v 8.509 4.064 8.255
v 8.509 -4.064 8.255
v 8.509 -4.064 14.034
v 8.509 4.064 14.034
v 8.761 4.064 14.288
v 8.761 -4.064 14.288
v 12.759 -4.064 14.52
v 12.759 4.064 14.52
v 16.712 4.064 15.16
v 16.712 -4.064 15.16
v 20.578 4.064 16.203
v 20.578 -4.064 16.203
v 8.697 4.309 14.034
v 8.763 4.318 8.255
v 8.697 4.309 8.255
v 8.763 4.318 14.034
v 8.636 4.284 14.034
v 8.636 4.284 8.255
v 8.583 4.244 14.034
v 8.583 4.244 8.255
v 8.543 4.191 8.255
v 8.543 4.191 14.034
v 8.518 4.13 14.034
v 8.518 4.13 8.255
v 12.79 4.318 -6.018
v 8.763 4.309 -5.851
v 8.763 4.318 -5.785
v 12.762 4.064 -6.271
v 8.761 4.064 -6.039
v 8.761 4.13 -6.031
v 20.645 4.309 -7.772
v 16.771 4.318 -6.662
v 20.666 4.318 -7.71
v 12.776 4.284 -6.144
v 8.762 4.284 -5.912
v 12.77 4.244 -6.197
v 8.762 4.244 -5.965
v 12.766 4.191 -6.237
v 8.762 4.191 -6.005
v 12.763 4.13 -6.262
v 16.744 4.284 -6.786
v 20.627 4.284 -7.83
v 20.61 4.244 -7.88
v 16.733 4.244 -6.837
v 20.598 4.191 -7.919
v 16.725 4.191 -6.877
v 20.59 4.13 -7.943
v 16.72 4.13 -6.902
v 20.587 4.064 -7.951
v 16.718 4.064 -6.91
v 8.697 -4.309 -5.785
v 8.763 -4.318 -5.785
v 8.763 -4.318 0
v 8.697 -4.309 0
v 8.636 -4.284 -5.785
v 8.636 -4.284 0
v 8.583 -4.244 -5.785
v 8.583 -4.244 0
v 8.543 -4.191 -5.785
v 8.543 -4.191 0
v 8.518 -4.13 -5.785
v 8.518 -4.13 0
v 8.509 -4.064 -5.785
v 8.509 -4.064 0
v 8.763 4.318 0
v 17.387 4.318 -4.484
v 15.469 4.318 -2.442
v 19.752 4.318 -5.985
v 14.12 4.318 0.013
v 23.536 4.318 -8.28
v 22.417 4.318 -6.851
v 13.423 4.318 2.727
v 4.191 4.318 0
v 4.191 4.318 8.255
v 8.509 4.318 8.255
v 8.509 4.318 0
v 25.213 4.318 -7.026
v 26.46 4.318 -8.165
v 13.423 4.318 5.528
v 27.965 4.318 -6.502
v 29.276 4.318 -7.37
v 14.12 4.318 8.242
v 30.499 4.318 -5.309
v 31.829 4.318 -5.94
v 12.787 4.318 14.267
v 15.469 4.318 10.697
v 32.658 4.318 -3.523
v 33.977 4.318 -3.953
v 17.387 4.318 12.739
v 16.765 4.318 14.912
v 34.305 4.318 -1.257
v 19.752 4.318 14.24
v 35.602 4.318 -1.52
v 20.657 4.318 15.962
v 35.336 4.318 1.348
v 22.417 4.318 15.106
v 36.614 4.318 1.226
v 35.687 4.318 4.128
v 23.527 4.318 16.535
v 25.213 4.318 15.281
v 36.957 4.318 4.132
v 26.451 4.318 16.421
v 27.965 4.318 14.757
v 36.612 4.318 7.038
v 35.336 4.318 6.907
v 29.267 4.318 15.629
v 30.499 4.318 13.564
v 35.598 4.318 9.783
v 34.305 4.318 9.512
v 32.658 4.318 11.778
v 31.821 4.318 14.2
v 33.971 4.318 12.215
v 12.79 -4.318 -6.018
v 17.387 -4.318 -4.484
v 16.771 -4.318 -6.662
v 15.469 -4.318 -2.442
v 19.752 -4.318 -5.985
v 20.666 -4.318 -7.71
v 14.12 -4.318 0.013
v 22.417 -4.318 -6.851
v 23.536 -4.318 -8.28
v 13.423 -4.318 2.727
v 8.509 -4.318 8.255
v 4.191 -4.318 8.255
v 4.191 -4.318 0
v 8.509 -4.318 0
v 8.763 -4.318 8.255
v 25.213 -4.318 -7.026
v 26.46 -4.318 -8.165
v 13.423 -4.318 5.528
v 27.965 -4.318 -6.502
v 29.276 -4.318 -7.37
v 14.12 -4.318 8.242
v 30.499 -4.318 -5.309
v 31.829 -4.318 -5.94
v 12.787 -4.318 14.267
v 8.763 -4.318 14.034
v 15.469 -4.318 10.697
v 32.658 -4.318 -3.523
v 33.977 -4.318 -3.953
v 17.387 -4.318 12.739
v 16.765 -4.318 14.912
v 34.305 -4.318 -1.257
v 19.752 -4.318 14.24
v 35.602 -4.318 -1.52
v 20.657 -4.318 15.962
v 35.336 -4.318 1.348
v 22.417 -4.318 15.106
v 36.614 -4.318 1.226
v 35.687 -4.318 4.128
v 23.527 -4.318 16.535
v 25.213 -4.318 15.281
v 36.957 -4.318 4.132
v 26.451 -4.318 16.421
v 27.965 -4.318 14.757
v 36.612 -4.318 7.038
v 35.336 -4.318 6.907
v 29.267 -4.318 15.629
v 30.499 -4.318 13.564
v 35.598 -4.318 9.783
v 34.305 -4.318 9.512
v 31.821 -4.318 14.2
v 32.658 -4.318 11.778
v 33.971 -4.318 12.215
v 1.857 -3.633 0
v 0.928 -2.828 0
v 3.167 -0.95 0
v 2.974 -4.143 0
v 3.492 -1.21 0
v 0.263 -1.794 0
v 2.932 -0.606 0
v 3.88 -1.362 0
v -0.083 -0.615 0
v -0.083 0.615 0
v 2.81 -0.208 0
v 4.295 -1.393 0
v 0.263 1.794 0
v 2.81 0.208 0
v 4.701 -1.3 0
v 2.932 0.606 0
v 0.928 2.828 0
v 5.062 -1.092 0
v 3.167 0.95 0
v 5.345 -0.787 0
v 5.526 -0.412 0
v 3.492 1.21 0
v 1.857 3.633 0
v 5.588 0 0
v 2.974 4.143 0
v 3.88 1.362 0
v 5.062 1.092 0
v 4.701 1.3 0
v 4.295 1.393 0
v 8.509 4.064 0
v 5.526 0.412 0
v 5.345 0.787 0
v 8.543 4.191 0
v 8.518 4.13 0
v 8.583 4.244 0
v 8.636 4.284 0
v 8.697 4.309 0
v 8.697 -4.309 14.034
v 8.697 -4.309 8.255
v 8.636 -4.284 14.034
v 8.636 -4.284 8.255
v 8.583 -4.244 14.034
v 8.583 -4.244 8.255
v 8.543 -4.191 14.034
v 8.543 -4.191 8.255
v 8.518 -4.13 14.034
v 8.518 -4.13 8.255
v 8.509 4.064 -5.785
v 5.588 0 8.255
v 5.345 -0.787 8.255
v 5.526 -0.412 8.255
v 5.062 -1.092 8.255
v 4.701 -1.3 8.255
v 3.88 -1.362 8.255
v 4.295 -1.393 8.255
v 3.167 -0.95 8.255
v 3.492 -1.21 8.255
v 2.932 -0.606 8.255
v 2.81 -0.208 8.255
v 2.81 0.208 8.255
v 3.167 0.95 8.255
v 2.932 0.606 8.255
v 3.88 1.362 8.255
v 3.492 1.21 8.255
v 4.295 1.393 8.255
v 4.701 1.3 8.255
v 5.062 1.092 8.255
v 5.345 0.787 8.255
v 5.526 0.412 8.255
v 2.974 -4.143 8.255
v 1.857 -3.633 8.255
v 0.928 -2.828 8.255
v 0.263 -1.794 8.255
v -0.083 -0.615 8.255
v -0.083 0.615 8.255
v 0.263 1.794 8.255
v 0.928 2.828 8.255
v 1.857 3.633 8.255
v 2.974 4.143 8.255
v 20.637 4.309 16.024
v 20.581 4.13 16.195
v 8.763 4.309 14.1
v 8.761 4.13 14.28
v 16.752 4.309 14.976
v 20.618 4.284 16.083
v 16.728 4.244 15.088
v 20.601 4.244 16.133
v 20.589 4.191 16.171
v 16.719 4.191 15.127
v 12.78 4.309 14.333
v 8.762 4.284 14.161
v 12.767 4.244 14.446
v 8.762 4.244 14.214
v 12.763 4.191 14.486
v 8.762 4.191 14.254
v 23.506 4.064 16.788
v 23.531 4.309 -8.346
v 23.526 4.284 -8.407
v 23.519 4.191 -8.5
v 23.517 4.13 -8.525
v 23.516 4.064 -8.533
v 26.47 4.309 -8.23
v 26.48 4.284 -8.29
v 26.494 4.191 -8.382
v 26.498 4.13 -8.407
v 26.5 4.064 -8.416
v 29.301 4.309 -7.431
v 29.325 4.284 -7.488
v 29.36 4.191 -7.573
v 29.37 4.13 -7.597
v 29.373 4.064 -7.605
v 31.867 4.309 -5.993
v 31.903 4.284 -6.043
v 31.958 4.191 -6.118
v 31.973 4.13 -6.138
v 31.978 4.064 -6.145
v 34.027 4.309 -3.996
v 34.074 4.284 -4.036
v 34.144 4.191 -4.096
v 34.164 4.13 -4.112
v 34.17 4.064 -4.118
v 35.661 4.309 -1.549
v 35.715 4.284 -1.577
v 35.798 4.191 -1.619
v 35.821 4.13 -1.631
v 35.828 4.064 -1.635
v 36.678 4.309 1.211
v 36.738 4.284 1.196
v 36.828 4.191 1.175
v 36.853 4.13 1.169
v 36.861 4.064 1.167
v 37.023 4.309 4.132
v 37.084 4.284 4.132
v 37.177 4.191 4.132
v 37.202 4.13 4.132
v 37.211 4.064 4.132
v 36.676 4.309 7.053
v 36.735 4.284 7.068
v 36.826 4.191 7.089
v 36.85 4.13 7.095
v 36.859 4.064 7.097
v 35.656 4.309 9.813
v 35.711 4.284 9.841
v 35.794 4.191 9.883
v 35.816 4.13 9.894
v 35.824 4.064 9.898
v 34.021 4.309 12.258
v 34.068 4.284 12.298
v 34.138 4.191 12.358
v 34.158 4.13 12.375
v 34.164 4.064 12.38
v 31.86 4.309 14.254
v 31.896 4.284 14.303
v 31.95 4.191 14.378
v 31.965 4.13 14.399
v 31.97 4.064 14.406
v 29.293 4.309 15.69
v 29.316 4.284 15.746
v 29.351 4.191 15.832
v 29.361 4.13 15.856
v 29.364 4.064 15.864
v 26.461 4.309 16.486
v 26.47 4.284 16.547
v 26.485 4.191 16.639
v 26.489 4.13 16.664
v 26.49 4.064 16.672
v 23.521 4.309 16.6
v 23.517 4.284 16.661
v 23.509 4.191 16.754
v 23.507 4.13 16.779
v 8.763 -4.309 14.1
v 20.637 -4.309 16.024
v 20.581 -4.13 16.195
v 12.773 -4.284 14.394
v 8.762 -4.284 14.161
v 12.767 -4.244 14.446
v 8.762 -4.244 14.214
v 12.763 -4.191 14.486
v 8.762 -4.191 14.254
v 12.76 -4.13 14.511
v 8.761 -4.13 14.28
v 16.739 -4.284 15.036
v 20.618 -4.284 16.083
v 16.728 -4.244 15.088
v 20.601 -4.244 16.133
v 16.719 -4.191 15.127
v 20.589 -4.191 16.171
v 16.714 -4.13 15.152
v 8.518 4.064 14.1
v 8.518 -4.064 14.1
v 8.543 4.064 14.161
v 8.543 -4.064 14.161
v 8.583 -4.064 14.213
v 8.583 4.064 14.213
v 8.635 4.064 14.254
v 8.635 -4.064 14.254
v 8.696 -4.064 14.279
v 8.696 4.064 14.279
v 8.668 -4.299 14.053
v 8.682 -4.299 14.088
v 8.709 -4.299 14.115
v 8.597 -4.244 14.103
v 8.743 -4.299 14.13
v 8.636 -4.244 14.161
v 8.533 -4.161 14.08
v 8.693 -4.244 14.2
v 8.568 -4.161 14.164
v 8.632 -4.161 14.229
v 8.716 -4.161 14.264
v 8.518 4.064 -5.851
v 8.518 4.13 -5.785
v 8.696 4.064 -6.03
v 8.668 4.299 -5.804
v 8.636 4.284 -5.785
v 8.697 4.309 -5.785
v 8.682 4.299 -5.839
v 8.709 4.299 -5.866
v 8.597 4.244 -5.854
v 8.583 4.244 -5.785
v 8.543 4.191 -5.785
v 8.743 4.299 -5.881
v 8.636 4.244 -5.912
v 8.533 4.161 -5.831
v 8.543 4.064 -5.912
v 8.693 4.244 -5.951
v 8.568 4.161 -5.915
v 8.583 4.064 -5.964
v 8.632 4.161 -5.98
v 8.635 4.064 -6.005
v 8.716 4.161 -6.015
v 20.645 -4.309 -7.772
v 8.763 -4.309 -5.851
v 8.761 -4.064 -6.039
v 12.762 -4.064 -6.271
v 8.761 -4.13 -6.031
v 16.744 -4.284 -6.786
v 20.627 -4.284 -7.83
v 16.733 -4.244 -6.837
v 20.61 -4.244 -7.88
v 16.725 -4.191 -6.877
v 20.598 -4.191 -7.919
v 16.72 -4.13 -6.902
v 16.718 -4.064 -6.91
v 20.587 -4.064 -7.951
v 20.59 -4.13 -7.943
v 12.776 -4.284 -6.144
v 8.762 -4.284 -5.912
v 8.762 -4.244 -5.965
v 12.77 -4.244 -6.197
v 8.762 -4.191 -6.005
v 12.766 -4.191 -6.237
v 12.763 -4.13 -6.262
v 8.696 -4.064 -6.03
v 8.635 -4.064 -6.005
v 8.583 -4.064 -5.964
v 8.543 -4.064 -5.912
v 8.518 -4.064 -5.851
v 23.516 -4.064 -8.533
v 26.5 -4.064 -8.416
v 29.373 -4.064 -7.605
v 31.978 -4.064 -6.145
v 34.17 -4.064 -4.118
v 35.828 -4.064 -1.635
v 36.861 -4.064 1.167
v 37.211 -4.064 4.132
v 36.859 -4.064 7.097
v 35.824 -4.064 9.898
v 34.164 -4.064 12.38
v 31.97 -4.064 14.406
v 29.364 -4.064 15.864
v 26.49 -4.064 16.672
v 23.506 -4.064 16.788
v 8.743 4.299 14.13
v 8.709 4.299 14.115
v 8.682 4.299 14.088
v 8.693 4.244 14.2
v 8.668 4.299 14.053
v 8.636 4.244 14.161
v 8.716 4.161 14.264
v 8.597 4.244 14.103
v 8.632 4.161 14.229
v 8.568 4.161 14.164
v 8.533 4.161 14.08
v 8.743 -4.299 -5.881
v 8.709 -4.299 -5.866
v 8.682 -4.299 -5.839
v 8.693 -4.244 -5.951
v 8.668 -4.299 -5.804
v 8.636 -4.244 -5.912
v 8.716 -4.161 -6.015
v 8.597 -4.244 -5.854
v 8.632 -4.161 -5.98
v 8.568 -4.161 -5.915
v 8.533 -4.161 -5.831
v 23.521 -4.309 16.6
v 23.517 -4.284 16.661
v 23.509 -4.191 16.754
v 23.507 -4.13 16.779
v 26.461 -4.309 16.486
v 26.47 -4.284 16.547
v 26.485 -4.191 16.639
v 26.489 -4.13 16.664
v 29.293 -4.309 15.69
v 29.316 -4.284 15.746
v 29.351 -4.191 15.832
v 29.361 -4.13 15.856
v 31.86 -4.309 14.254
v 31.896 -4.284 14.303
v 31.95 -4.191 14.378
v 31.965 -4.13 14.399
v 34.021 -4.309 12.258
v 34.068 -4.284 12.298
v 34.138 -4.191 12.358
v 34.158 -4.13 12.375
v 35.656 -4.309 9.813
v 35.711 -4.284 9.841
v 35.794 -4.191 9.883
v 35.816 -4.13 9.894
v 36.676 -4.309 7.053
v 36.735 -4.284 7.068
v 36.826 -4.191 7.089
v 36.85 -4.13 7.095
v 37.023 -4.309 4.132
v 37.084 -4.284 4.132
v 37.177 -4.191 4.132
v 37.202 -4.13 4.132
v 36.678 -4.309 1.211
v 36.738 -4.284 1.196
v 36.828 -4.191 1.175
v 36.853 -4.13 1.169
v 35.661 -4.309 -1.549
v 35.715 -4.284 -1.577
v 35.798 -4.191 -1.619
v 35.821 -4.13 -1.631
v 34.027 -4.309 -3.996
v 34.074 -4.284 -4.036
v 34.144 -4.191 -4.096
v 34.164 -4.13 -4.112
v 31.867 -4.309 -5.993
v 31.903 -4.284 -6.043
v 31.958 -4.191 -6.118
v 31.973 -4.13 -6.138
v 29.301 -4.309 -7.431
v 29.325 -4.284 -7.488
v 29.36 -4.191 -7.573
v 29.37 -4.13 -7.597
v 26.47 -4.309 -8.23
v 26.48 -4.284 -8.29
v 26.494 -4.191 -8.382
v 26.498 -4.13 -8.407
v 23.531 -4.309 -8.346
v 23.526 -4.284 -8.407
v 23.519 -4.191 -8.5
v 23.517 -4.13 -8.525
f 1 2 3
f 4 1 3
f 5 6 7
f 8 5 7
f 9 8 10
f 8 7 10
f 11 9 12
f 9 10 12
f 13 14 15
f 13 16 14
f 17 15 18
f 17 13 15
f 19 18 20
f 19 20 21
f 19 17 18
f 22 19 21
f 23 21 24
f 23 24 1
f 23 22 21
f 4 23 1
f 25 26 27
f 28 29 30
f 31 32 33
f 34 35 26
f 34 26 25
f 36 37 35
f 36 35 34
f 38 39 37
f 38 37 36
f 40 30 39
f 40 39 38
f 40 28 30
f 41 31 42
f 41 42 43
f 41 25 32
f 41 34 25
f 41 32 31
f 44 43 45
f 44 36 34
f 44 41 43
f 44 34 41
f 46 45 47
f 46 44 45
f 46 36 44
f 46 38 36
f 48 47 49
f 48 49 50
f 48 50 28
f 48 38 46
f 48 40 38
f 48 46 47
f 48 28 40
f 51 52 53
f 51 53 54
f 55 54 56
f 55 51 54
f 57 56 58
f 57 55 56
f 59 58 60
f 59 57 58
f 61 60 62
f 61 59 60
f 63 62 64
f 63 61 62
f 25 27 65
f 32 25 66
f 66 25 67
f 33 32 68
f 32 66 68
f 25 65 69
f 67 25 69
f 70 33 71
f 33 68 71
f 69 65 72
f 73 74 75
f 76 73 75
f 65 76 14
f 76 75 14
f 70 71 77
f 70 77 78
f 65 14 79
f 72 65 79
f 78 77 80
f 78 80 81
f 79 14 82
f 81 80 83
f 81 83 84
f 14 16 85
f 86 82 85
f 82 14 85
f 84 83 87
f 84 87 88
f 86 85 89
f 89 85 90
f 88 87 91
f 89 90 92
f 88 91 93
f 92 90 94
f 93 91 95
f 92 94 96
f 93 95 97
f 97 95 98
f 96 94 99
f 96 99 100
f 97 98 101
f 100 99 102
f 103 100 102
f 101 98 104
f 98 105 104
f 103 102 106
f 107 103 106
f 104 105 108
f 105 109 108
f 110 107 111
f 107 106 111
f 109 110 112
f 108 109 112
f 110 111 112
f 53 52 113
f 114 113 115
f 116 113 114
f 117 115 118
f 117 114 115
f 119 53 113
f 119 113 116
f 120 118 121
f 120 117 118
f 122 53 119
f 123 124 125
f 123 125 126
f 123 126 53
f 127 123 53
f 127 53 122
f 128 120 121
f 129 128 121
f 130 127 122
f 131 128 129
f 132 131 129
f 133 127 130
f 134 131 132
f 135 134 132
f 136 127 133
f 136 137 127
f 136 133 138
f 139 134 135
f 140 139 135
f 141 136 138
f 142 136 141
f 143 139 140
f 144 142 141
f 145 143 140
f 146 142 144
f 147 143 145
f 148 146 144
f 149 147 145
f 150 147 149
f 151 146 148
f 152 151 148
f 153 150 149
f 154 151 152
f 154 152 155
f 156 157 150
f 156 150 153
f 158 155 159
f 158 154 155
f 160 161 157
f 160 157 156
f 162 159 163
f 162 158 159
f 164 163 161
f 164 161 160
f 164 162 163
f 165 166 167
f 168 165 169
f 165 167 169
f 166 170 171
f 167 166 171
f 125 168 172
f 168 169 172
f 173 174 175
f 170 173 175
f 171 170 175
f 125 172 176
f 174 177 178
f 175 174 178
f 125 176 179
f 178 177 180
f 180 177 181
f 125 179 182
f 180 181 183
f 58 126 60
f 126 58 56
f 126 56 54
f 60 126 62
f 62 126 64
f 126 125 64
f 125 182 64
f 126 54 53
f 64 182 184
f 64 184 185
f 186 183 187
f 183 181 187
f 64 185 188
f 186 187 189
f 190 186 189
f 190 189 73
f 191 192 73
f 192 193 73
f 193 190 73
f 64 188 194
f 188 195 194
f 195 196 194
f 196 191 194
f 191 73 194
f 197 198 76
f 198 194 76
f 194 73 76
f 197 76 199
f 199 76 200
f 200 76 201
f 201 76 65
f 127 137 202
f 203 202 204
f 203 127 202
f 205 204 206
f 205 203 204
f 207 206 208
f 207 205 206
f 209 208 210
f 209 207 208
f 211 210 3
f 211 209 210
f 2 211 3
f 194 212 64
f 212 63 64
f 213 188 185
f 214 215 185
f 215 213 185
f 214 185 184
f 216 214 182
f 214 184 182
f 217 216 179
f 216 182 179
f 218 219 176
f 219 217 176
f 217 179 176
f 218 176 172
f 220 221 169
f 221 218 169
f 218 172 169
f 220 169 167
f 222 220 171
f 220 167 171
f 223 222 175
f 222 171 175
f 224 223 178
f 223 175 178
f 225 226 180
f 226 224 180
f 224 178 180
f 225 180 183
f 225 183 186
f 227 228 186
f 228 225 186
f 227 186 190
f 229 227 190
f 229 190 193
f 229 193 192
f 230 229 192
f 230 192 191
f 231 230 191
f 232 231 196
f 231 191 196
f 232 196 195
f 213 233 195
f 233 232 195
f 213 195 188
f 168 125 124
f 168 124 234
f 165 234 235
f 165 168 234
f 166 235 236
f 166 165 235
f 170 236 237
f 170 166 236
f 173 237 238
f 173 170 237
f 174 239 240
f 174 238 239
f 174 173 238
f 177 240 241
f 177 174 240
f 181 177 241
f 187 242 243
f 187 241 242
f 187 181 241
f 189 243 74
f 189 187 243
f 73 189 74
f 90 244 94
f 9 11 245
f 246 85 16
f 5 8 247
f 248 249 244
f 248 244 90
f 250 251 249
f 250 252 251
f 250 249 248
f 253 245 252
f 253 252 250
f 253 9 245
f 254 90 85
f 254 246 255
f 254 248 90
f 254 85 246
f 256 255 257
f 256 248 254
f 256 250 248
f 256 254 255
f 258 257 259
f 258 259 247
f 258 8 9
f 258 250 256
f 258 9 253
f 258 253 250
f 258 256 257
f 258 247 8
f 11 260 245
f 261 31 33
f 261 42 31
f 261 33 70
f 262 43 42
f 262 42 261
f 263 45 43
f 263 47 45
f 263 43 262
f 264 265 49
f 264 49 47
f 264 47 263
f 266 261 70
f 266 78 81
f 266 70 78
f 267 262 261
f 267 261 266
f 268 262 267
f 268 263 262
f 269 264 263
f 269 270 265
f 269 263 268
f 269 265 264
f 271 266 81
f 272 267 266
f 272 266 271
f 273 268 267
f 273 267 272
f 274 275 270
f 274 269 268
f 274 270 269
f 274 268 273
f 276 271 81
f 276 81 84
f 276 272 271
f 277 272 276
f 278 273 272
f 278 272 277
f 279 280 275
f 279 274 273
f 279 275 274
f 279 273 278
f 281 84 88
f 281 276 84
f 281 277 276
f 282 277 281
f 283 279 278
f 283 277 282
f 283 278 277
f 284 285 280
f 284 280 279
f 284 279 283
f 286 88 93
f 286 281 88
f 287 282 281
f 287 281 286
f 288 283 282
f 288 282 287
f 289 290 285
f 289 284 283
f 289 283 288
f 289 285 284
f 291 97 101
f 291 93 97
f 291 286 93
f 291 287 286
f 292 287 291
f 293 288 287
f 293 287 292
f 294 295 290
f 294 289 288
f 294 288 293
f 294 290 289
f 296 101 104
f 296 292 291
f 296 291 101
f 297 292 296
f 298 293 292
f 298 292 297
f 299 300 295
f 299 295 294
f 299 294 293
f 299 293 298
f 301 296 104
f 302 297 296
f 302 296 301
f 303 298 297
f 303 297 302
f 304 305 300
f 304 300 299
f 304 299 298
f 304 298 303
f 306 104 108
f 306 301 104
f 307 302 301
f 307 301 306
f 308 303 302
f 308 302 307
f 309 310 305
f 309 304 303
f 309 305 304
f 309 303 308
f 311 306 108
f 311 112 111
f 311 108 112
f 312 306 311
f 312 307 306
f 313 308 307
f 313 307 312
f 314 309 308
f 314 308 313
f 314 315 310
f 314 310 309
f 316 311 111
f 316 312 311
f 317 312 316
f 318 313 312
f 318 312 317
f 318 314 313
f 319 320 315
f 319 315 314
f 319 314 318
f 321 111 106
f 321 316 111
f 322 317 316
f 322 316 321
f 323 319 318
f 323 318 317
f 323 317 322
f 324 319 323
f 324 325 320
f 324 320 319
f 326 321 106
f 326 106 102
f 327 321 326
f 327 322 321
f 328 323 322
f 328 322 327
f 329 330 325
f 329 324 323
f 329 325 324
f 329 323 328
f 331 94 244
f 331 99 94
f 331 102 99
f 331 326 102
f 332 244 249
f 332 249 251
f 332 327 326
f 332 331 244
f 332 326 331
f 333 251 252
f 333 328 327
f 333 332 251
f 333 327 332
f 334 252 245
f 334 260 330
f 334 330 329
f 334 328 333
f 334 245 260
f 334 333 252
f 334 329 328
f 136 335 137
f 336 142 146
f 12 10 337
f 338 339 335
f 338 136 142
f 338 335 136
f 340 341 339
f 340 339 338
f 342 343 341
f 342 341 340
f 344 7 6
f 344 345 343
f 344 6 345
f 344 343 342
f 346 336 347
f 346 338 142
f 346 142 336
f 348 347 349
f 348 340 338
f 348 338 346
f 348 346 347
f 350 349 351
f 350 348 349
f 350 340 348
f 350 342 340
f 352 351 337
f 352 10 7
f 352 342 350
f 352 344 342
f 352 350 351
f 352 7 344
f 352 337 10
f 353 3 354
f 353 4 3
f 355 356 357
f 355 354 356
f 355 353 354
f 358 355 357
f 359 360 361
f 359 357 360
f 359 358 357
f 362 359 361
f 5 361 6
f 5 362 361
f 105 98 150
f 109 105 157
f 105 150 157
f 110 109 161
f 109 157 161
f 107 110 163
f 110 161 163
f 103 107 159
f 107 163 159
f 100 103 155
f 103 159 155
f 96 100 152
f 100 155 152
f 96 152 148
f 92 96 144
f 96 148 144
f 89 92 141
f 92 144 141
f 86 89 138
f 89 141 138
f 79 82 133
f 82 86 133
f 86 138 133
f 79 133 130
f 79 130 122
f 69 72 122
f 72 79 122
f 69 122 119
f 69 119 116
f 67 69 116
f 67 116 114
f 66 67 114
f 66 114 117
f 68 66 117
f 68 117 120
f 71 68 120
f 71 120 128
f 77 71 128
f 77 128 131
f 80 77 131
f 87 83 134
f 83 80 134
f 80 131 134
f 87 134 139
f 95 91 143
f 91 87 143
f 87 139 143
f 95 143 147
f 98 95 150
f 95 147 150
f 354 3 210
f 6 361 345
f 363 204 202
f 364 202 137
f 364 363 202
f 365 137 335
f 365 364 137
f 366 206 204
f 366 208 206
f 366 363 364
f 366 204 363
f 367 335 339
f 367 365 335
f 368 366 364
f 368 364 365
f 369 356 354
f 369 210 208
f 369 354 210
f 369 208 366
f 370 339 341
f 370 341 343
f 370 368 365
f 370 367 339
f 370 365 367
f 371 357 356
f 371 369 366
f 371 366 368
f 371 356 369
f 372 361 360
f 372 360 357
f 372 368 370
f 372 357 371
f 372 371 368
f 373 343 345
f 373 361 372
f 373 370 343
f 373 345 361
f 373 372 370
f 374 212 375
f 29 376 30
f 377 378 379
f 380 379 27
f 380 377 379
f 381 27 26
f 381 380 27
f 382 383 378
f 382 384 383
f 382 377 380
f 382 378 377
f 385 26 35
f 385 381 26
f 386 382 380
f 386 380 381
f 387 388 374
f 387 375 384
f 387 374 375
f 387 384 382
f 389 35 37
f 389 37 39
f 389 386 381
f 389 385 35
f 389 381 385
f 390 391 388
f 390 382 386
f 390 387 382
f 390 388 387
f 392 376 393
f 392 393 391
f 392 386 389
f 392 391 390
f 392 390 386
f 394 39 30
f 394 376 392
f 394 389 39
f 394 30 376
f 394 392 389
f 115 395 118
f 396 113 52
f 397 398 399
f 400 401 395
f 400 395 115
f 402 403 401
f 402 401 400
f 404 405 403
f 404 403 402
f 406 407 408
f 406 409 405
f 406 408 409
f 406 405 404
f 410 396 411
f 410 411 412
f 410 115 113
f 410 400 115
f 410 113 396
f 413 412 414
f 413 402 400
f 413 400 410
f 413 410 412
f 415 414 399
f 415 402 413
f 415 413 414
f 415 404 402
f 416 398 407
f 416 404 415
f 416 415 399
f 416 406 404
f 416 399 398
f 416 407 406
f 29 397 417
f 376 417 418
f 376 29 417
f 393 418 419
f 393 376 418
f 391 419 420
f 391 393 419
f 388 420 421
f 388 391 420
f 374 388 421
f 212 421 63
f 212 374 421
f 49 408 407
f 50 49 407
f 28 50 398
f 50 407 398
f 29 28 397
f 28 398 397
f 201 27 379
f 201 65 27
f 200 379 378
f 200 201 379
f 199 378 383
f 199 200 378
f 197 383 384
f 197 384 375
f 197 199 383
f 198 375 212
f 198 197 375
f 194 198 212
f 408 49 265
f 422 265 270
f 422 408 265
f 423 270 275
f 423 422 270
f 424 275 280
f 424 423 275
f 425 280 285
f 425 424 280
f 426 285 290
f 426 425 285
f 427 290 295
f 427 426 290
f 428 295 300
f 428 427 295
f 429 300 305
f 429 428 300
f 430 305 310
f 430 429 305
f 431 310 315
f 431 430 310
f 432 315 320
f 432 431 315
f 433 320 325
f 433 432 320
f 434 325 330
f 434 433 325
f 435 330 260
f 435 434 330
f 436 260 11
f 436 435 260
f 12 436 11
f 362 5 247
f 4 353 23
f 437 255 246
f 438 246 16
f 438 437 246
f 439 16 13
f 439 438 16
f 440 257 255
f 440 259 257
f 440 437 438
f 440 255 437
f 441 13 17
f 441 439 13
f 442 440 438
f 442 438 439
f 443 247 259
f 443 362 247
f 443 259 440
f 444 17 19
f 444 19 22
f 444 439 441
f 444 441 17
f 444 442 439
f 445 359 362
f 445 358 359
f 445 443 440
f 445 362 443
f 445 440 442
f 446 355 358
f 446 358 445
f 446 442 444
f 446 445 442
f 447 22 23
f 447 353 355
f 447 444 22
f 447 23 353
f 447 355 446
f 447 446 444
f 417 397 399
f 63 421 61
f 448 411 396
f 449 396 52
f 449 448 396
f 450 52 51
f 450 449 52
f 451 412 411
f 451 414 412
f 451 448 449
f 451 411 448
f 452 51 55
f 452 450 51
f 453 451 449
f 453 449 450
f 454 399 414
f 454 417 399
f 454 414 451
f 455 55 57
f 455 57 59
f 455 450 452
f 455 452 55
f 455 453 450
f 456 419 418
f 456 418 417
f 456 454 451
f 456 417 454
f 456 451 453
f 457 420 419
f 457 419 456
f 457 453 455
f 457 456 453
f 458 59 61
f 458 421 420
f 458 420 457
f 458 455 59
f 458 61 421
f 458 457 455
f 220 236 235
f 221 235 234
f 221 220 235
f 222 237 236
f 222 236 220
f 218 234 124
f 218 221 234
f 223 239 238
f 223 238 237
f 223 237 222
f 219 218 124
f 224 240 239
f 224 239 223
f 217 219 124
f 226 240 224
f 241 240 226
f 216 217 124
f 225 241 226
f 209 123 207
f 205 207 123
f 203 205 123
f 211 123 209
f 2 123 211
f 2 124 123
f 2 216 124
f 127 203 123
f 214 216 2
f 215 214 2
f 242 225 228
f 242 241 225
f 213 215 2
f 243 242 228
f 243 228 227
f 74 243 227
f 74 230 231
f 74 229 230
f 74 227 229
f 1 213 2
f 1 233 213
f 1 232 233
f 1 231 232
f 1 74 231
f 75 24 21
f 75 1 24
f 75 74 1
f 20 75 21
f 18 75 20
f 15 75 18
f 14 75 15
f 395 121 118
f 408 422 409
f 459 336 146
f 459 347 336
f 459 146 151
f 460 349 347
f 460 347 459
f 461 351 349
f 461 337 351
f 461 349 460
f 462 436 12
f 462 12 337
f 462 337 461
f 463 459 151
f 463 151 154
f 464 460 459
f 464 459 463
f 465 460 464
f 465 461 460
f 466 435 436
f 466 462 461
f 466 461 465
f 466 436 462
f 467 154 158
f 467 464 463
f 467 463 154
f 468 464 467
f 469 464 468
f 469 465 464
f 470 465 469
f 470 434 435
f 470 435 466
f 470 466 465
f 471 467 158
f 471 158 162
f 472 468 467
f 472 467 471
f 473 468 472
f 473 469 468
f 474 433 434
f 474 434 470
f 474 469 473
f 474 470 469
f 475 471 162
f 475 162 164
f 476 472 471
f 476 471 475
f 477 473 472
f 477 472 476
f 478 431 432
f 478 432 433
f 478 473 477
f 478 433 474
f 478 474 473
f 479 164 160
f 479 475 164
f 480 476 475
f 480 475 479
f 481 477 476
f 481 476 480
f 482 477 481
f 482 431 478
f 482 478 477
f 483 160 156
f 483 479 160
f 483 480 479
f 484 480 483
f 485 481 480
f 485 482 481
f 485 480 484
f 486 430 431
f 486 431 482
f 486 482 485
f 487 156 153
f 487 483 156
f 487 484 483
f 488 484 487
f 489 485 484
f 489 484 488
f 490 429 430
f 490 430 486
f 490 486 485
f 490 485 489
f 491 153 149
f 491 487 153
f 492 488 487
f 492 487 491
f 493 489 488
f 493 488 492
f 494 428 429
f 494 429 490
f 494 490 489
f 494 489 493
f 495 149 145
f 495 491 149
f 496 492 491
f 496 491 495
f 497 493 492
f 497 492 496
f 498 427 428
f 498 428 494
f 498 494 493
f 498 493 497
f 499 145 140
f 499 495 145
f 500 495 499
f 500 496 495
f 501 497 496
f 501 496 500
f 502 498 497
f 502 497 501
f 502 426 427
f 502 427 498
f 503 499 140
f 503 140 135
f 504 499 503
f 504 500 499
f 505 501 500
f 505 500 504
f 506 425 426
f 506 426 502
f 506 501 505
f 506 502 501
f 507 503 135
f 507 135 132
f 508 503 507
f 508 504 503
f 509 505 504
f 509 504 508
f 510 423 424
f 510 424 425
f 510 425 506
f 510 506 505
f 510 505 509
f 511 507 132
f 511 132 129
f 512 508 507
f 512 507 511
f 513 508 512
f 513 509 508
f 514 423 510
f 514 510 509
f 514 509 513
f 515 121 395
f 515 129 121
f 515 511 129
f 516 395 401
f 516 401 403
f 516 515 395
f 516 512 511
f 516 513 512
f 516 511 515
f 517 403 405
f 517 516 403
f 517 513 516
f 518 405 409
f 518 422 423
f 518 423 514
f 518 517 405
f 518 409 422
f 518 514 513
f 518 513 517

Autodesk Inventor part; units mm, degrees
ref_plane "YZ Plane" through (0, 0, 0) normal (1, 0, 0) x (0, 1, 0)
sketch "Sketch2" plane through (0, 0, 0) normal (0, 0, 1) x (1, 0, 0)
  arc A0 (4.191, -4.318) -> (4.191, 4.318) centre (4.191, 0) ccw projected
  arc A1 (4.191, 4.318) -> (4.191, -4.318) centre (4.191, 0) ccw
  circle A2 centre (4.191, 0) radius 1.397 projected
  line L0 (8.509, 0) -> (8.509, 4.318)
  line L1 (8.509, 4.318) -> (4.191, 4.318)
  line L2 (8.509, 0) -> (8.509, -4.318)
  line L3 (8.509, -4.318) -> (4.191, -4.318)
  point P0 (0, 0)
ref_plane "Work Plane1" through (0, -4.064, 8.255) normal (0, 0, -1) x (0, 1, 0)
extrude "Extrusion1" add sketch "Sketch2" along normal up to surface (8.255 mm away)
ref_plane "Work Plane2" through (0, 0, 4.1275) normal (0, 0, -1) x (-1, 0, 0)
sketch "Sketch3" plane through (4.191, -4.318, 0) normal (0, -1, 0) x (1, 0, 0)
  circle A0 centre (20.32, 4.1275) radius 12.7
  line L0 (40.4876, 4.1275) -> (-11.7856, 4.1275) projected
  line L1 (4.318, 0) -> (4.318, 8.255) projected
  circle A1 centre (20.32, 4.1275) radius 11.176
  line L2 (0, 14.2875) -> (4.064, 14.2875) projected
  line L3 (4.064, -6.0325) -> (0, -6.0325) projected
  line L4 (0, 0) -> (4.318, 0) projected
  line L5 (4.318, 0) -> (4.318, -6.0386)
  line L6 (4.318, 8.255) -> (4.318, 14.2875)
  arc A2 (4.318, 14.2875) -> (16.3873, 16.2033) centre (4.318, 53.2638) ccw
  arc A3 (16.3963, -7.9512) -> (4.318, -6.0386) centre (4.318, -45.1333) ccw
  point P0 (-4.191, 0)
  dimension "d2" = 25.4
  dimension "d3" = 0
  dimension "d4" = 16.002
  dimension "d5" = 1.524
  dimension "d8" = 0
  dimension "d9" = 0.0061
extrude "Extrusion2" add sketch "Sketch3" against normal up to surface (8.636 mm away) contours L0 A1 A0 | A0 L0 A1 | A0 L0 L1 L6 A2 | A3 L5 L1 L0 A0
fillet "Fillet1" radius 0.254 12 edges at (8.509, 4.318, -3.0193) (8.509, 4.318, 11.2712) (8.509, 0, -6.0386) (8.509, -4.318, -3.0193) (8.509, -4.318, 11.2712) (8.509, 0, 14.2875) (37.211, -4.318, 4.1322) (14.6234, -4.318, -6.5197) (14.6192, -4.318, 14.7694) (37.211, 4.318, 4.1322) (14.6234, 4.318, -6.5197) (14.6192, 4.318, 14.7694)
properties part number "wrenchB"
